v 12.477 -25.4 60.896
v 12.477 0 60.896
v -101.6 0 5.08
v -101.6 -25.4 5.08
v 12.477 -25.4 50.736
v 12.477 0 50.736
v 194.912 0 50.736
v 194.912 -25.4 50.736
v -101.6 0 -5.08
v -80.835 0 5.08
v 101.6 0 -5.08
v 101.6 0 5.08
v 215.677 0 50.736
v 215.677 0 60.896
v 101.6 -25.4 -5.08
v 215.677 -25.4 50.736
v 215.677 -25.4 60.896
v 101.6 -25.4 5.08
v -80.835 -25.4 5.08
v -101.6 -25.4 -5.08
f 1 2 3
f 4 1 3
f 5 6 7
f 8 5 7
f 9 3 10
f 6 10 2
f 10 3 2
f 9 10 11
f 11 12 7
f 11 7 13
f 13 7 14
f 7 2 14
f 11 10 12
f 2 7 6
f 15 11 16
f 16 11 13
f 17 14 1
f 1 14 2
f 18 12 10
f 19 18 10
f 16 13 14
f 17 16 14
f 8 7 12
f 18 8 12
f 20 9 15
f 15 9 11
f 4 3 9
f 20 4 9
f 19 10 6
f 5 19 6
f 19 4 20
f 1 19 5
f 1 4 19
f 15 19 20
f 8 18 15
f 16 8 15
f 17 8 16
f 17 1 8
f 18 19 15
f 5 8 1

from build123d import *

# Parameters (mm, degrees)
F1_DEPTH = 25.4


with BuildPart() as f1:
    # F0 (on Front) → F1 (new body)
    with BuildSketch(Plane.XZ):
        Polygon((-101.6, -5.08), (101.6, -5.08), (101.6, 5.08), (-80.834732, 5.08), align=None)
        Polygon((101.6, 5.08), (101.6, -5.08), (215.677269, 50.735559), (194.912001, 50.735559), align=None)
        Polygon((-101.6, 5.08), (-101.6, -5.08), (-80.834732, 5.08), align=None)
        Polygon((194.912001, 50.735559), (215.677269, 50.735559), (215.677269, 60.895559), align=None)
        Polygon((12.477269, 60.895559), (-101.6, 5.08), (-80.834732, 5.08), (12.477269, 50.735559), align=None)
        Polygon((12.477269, 50.735559), (194.912001, 50.735559), (215.677269, 60.895559), (12.477269, 60.895559), align=None)
    extrude(amount=F1_DEPTH)


solid = f1.part
